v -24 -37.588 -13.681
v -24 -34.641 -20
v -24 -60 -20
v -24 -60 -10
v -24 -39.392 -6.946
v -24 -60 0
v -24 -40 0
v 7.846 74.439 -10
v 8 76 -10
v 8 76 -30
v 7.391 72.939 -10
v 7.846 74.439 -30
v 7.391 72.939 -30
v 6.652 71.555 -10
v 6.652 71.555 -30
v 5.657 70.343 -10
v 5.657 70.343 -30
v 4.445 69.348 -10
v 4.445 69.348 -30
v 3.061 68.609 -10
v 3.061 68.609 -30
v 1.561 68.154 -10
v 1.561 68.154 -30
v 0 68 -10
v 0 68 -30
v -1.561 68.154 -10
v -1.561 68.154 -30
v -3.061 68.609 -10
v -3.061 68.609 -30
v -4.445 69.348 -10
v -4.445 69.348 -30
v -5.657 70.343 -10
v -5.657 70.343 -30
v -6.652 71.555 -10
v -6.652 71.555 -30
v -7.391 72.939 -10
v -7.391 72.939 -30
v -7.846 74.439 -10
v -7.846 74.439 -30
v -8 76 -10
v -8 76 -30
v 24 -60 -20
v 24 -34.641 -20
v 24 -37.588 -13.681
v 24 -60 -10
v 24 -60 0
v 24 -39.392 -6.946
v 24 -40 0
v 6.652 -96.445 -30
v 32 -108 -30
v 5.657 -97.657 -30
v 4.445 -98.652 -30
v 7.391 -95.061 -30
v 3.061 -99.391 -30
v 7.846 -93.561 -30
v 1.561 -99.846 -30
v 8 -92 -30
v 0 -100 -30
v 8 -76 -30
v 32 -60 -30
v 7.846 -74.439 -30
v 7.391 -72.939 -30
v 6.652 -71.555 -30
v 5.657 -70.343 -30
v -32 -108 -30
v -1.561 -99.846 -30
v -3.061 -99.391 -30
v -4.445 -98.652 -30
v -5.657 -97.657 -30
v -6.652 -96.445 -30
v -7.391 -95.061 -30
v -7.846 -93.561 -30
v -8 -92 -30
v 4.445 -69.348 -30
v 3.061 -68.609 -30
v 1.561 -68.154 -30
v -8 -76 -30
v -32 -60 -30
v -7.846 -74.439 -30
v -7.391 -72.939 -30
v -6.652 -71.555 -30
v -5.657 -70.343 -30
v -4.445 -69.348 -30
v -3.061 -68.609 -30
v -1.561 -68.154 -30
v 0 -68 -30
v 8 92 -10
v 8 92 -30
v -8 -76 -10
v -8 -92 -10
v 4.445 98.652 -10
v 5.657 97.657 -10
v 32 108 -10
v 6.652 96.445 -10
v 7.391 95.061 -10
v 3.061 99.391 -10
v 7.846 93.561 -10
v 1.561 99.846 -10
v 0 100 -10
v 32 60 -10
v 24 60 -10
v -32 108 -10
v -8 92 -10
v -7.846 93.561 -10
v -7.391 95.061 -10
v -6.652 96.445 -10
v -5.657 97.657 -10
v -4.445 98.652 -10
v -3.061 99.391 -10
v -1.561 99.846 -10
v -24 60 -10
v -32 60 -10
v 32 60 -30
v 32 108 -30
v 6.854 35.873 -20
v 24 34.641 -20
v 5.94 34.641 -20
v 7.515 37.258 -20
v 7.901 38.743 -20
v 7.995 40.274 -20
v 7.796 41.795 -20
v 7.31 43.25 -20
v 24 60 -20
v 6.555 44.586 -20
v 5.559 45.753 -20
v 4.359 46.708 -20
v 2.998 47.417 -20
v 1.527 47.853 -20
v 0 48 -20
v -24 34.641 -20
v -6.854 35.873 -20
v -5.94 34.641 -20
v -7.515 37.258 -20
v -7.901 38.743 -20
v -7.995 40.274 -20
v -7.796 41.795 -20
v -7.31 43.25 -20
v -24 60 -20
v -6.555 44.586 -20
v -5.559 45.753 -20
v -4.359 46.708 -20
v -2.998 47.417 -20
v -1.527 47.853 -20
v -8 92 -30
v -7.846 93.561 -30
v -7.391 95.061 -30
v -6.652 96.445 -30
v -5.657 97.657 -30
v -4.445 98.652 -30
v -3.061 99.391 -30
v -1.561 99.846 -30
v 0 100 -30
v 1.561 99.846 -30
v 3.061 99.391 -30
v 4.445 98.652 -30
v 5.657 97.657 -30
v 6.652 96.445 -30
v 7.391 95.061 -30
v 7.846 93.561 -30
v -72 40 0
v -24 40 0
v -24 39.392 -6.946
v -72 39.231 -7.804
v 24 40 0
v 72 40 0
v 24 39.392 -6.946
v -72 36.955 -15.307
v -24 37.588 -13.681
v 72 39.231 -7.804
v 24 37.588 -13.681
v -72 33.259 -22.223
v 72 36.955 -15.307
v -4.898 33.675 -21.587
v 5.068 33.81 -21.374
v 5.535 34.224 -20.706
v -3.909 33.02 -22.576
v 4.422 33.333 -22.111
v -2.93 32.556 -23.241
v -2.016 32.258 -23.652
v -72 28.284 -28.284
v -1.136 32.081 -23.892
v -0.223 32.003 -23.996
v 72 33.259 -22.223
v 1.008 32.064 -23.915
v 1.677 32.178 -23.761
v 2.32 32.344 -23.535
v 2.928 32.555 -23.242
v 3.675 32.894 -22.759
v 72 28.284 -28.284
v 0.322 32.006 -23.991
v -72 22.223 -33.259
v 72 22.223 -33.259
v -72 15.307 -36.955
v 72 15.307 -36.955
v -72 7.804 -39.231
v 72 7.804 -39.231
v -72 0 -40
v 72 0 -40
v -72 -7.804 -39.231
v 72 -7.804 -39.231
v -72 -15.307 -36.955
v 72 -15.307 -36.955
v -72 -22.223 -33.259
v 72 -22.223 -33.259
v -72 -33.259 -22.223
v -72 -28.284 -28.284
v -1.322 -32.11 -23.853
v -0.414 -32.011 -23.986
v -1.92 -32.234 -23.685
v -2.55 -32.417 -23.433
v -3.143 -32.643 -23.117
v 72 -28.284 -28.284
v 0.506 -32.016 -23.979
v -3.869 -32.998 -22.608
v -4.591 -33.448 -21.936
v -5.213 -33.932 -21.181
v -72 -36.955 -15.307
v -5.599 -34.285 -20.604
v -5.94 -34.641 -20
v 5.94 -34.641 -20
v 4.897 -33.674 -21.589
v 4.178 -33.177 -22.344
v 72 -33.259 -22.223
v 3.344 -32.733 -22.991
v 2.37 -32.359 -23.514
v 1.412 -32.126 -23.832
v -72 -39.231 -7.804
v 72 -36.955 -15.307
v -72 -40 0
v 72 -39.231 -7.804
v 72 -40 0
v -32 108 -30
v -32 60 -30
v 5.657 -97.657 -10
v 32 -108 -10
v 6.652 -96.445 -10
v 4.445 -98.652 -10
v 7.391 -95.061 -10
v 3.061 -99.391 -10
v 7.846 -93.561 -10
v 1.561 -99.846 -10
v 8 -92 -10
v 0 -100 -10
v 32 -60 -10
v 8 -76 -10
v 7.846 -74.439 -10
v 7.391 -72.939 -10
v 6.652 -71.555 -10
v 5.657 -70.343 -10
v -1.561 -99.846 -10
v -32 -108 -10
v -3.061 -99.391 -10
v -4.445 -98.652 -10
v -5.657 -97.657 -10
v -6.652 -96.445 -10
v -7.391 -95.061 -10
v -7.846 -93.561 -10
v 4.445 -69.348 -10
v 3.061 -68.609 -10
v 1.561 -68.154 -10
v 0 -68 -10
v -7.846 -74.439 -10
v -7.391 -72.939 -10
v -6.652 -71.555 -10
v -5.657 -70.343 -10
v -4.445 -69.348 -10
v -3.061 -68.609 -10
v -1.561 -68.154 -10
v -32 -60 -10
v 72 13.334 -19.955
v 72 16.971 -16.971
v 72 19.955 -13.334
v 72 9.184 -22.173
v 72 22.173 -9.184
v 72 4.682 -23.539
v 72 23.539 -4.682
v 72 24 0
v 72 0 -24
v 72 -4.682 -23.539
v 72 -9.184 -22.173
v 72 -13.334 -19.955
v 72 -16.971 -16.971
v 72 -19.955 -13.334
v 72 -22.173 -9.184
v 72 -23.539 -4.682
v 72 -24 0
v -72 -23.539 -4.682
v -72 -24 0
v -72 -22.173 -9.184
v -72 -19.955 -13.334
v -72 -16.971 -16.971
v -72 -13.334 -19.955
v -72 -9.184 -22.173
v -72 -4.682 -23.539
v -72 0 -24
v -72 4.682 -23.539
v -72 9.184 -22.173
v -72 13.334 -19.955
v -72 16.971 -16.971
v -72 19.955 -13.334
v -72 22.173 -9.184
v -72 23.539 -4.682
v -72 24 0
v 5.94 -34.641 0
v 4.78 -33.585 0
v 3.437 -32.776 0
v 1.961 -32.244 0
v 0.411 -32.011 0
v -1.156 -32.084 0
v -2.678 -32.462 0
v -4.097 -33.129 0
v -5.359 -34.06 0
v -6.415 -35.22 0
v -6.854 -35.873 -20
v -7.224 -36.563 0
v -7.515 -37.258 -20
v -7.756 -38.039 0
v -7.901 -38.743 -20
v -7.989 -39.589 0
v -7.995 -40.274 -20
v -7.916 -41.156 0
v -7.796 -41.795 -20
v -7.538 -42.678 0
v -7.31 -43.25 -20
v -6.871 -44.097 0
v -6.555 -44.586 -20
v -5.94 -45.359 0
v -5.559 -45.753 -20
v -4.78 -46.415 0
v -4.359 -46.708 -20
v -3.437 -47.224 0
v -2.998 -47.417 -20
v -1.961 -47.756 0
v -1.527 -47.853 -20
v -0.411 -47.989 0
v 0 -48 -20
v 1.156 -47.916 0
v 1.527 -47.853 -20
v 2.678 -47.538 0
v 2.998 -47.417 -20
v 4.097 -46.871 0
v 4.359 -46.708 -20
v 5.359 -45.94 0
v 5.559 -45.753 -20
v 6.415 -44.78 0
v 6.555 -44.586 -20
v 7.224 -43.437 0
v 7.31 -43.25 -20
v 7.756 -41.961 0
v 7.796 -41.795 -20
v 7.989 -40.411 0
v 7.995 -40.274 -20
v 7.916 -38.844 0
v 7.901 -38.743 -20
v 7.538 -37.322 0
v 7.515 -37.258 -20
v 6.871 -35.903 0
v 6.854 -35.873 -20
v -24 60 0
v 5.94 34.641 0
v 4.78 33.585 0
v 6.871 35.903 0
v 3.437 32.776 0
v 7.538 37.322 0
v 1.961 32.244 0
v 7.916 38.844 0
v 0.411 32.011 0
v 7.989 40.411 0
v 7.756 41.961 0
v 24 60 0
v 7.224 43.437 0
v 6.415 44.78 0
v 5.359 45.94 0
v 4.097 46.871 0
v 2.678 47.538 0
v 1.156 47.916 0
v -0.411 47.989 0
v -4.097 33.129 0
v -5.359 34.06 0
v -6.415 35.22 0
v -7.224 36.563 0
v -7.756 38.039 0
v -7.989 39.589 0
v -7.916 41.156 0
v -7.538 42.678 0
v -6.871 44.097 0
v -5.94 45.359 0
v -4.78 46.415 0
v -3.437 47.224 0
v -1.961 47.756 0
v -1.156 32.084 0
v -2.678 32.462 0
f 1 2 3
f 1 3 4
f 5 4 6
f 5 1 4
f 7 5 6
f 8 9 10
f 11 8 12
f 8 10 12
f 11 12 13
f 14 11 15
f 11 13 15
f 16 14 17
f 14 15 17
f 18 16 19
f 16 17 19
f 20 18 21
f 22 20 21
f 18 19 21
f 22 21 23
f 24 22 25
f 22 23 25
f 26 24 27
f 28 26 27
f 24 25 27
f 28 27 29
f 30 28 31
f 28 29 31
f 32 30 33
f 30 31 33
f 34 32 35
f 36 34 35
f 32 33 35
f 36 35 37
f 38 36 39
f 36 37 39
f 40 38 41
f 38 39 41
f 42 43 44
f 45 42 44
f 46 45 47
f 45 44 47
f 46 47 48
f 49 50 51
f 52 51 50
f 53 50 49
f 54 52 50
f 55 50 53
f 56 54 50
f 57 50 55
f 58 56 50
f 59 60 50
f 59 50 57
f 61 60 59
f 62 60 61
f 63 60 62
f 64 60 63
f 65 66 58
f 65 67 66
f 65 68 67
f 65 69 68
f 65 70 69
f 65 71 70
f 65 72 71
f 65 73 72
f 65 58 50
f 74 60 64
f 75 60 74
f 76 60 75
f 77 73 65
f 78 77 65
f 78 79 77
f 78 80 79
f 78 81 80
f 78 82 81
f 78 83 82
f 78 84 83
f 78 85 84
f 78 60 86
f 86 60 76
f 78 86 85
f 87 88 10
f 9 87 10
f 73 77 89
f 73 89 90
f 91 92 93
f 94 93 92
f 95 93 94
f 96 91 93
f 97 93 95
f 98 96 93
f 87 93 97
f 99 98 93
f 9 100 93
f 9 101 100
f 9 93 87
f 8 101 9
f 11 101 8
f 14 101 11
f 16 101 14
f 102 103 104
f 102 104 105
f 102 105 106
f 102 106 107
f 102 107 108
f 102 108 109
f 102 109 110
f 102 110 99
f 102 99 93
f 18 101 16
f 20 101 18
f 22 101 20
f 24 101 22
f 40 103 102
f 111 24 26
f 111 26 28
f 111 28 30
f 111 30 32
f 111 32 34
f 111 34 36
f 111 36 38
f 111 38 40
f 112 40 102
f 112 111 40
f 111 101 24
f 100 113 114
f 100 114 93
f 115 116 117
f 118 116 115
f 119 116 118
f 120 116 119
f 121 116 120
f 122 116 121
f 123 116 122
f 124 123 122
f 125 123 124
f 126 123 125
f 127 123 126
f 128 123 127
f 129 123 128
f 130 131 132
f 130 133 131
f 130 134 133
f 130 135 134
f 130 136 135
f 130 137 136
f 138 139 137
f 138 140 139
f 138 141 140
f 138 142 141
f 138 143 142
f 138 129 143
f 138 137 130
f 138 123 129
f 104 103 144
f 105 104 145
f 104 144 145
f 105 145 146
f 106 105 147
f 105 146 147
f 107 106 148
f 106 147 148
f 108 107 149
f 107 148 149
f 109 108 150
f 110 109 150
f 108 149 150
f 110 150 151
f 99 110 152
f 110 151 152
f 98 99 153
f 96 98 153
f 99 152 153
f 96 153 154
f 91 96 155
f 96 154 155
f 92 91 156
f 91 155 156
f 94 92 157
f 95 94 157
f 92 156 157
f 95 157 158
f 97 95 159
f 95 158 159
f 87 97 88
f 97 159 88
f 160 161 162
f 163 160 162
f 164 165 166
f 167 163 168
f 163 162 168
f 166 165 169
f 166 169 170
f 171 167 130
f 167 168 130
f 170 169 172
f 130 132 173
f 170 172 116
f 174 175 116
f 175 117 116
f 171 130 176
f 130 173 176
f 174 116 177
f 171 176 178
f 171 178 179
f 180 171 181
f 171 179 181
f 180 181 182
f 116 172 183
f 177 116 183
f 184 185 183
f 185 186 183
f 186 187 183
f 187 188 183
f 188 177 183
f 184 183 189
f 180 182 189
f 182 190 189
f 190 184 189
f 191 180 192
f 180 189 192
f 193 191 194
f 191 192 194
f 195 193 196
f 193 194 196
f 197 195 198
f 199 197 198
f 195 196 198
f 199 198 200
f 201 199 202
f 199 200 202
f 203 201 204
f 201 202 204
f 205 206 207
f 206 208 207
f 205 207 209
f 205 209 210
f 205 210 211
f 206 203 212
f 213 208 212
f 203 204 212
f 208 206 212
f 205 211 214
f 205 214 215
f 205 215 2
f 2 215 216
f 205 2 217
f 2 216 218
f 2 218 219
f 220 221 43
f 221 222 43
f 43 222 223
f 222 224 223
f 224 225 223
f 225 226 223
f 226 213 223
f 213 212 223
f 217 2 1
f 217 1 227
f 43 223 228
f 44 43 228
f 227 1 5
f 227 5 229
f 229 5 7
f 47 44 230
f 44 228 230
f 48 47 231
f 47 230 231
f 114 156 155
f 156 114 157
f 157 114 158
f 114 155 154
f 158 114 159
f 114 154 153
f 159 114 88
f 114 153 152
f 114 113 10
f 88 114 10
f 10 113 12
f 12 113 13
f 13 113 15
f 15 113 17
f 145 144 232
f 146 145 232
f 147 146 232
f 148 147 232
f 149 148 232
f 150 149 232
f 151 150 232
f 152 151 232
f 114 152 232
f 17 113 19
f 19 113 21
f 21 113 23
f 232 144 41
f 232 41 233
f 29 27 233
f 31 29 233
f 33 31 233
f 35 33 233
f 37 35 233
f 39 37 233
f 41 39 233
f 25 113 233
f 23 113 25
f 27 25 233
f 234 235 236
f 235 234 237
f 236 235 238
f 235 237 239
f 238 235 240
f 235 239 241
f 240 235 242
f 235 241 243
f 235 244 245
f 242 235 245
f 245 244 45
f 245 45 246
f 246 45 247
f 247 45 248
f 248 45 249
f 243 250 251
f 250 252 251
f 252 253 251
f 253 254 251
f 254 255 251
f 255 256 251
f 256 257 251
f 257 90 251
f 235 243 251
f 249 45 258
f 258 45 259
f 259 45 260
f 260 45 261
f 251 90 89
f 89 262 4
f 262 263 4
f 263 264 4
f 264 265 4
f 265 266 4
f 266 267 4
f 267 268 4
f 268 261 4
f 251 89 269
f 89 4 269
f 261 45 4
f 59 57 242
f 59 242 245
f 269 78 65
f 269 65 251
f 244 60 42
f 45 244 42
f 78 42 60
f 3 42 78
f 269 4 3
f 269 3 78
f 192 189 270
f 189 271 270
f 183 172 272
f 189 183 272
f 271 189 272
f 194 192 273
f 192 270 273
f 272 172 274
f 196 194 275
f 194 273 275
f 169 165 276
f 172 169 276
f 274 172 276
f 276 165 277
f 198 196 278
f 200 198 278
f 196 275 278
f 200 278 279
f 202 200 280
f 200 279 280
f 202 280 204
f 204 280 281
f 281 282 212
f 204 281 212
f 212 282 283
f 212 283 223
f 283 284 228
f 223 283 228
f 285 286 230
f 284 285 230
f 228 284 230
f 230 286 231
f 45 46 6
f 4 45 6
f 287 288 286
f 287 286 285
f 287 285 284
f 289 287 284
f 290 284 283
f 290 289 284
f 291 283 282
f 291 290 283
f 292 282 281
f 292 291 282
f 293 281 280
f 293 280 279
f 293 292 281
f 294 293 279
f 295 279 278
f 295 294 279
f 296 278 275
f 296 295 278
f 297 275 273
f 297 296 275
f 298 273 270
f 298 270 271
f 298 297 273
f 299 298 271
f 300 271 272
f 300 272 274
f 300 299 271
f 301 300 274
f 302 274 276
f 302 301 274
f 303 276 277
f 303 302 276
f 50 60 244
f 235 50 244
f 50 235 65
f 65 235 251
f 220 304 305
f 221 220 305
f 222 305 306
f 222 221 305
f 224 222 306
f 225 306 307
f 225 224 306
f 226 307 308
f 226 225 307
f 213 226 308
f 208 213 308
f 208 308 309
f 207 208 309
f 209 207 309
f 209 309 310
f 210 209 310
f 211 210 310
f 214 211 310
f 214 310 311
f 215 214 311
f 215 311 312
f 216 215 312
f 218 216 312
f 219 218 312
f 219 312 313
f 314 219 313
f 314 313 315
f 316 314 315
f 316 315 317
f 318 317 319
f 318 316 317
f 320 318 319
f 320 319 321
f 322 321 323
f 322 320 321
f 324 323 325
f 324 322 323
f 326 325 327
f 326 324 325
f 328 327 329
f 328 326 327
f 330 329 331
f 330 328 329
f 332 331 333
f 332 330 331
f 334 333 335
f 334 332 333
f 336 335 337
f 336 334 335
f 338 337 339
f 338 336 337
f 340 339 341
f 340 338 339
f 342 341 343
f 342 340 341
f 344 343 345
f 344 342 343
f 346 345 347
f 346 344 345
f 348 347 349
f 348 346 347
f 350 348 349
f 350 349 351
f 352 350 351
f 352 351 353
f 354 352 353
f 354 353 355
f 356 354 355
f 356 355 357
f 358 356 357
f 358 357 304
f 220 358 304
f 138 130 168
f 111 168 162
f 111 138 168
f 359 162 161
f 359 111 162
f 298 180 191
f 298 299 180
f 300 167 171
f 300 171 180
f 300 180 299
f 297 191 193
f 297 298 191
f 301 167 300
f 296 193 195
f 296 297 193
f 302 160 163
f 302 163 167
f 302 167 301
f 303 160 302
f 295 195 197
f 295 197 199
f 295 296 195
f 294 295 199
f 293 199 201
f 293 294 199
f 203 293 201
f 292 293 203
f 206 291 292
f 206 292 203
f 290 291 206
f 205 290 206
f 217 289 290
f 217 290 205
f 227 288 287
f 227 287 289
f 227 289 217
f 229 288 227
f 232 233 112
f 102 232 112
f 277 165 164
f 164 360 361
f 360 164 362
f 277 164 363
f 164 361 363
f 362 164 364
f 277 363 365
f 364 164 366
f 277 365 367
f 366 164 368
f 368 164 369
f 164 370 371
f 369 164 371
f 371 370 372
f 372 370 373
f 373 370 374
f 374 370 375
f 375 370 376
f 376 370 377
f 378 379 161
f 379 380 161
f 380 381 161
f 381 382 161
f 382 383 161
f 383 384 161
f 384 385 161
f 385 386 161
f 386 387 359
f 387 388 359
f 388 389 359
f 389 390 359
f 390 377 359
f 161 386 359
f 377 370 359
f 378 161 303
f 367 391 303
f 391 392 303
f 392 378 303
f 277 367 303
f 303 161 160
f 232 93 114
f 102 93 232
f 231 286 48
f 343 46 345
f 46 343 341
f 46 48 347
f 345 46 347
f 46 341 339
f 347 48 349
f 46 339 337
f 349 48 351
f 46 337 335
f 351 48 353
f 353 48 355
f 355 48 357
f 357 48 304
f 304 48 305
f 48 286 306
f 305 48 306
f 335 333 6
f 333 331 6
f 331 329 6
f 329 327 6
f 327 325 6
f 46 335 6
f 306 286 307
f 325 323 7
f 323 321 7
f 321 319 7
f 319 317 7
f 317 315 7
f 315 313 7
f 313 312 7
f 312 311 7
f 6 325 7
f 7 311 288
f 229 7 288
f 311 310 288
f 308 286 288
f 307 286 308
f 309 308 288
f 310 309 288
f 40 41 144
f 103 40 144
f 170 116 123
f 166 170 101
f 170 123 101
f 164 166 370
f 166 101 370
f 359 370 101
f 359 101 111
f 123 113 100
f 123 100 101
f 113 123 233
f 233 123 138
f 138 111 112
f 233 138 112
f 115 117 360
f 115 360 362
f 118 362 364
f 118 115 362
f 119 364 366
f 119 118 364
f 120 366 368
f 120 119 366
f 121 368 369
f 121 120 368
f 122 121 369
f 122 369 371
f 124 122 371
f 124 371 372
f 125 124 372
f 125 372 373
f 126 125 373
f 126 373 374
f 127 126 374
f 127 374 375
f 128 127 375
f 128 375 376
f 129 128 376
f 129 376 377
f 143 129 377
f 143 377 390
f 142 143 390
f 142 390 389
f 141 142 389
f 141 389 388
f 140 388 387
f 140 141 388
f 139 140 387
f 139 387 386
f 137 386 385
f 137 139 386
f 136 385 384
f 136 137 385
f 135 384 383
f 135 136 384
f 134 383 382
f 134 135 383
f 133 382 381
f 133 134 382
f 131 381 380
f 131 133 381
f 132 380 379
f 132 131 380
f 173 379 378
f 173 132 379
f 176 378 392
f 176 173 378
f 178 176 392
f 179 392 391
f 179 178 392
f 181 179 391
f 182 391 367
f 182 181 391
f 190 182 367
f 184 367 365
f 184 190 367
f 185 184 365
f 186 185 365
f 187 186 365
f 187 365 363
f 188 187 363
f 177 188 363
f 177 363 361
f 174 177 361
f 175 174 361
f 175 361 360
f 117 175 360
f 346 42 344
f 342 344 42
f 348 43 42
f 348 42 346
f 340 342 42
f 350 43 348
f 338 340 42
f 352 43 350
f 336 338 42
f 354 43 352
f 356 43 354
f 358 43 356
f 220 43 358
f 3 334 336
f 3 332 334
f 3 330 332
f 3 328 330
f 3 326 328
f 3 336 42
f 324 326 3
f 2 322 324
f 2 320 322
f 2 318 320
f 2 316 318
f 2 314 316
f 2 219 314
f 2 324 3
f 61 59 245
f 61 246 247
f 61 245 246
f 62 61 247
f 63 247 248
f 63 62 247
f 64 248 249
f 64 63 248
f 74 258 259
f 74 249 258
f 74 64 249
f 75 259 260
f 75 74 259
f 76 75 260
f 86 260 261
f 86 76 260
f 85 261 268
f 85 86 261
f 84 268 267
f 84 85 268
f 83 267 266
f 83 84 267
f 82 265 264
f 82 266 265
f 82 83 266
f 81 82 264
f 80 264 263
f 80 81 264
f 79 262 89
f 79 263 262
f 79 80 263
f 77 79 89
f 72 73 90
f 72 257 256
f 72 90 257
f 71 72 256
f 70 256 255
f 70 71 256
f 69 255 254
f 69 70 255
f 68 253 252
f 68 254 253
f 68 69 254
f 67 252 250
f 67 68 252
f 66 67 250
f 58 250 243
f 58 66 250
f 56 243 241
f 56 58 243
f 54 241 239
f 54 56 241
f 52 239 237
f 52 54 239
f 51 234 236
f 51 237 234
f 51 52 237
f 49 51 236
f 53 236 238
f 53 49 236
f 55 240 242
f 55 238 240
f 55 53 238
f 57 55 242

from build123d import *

# Parameters (mm, degrees)
BOSS_EXTRUDE1_DEPTH     = 72
SKETCH2_W               = 48
SKETCH2_H               = 20
BOSS_EXTRUDE2_DEPTH     = 120
CUT_EXTRUDE1_DEPTH      = 121.066648158
CUT_EXTRUDE1_DEPTH_BACK = 121.066648158
SKETCH4_R               = 24
SKETCH5_W               = 64
SKETCH5_H               = 20
BOSS_EXTRUDE3_DEPTH     = 48
CUT_EXTRUDE2_DEPTH      = 136.823414771
CUT_EXTRUDE2_DEPTH_BACK = 136.823414771
SKETCH6_R               = 8


with BuildPart() as part:
    # Sketch1 → Boss-Extrude1 (new, symmetric)
    with BuildSketch(Plane.YZ):
        with BuildLine():
            Line((-40, 0), (-24, 0))
            ThreePointArc((-24, 0), (0, -24), (24, 0))
            Line((24, 0), (40, 0))
            ThreePointArc((40, 0), (0, -40), (-40, 0))
        make_face()
    extrude(amount=BOSS_EXTRUDE1_DEPTH, both=True)

    # Sketch2 → Boss-Extrude2 (add)
    with BuildSketch(Plane(origin=(0, 60, 0), x_dir=(-1, 0, 0), z_dir=(0, 1, 0))):
        with Locations((0, -10)):
            Rectangle(SKETCH2_W, SKETCH2_H)
    extrude(amount=-BOSS_EXTRUDE2_DEPTH)

    # Sketch4 → Cut-Extrude1 (cut, two sides: drawn at the far end of the back side and taken through both)
    with BuildSketch(Plane.YZ.offset(24).offset(-CUT_EXTRUDE1_DEPTH_BACK)):
        Circle(SKETCH4_R)
    extrude(amount=CUT_EXTRUDE1_DEPTH + CUT_EXTRUDE1_DEPTH_BACK, mode=Mode.SUBTRACT)

    # Sketch5 → Boss-Extrude3 (add)
    with BuildSketch(Plane(origin=(0, 60, 0), x_dir=(-1, 0, 0), z_dir=(0, 1, 0))):
        with Locations((0, -20)):
            Rectangle(SKETCH5_W, SKETCH5_H)
    boss_extrude3 = extrude(amount=BOSS_EXTRUDE3_DEPTH)

    # Mirror1: Boss-Extrude3 across plane
    add(boss_extrude3.mirror(Plane.ZX))

    # Sketch6 → Cut-Extrude2 (cut, two sides: drawn at the far end of the back side and taken through both)
    with BuildSketch(Plane.XY.offset(-CUT_EXTRUDE2_DEPTH_BACK)):
        with Locations(Location((0, 40, 0), (0, 0, 317.942751882))):
            Circle(SKETCH6_R)
        with Locations(Location((0, -40, 0), (0, 0, 42.057262179))):
            Circle(SKETCH6_R)
        with BuildLine():
            Line((8, 92), (8, 76))
            ThreePointArc((8, 76), (0, 68), (-8, 76))
            Line((-8, 76), (-8, 92))
            ThreePointArc((-8, 92), (0, 100), (8, 92))
        make_face()
        with BuildLine():
            Line((8, -92), (8, -76))
            ThreePointArc((8, -76), (0, -68), (-8, -76))
            Line((-8, -76), (-8, -92))
            ThreePointArc((-8, -92), (0, -100), (8, -92))
        make_face()
    extrude(amount=CUT_EXTRUDE2_DEPTH + CUT_EXTRUDE2_DEPTH_BACK, mode=Mode.SUBTRACT)


solid = part.part
